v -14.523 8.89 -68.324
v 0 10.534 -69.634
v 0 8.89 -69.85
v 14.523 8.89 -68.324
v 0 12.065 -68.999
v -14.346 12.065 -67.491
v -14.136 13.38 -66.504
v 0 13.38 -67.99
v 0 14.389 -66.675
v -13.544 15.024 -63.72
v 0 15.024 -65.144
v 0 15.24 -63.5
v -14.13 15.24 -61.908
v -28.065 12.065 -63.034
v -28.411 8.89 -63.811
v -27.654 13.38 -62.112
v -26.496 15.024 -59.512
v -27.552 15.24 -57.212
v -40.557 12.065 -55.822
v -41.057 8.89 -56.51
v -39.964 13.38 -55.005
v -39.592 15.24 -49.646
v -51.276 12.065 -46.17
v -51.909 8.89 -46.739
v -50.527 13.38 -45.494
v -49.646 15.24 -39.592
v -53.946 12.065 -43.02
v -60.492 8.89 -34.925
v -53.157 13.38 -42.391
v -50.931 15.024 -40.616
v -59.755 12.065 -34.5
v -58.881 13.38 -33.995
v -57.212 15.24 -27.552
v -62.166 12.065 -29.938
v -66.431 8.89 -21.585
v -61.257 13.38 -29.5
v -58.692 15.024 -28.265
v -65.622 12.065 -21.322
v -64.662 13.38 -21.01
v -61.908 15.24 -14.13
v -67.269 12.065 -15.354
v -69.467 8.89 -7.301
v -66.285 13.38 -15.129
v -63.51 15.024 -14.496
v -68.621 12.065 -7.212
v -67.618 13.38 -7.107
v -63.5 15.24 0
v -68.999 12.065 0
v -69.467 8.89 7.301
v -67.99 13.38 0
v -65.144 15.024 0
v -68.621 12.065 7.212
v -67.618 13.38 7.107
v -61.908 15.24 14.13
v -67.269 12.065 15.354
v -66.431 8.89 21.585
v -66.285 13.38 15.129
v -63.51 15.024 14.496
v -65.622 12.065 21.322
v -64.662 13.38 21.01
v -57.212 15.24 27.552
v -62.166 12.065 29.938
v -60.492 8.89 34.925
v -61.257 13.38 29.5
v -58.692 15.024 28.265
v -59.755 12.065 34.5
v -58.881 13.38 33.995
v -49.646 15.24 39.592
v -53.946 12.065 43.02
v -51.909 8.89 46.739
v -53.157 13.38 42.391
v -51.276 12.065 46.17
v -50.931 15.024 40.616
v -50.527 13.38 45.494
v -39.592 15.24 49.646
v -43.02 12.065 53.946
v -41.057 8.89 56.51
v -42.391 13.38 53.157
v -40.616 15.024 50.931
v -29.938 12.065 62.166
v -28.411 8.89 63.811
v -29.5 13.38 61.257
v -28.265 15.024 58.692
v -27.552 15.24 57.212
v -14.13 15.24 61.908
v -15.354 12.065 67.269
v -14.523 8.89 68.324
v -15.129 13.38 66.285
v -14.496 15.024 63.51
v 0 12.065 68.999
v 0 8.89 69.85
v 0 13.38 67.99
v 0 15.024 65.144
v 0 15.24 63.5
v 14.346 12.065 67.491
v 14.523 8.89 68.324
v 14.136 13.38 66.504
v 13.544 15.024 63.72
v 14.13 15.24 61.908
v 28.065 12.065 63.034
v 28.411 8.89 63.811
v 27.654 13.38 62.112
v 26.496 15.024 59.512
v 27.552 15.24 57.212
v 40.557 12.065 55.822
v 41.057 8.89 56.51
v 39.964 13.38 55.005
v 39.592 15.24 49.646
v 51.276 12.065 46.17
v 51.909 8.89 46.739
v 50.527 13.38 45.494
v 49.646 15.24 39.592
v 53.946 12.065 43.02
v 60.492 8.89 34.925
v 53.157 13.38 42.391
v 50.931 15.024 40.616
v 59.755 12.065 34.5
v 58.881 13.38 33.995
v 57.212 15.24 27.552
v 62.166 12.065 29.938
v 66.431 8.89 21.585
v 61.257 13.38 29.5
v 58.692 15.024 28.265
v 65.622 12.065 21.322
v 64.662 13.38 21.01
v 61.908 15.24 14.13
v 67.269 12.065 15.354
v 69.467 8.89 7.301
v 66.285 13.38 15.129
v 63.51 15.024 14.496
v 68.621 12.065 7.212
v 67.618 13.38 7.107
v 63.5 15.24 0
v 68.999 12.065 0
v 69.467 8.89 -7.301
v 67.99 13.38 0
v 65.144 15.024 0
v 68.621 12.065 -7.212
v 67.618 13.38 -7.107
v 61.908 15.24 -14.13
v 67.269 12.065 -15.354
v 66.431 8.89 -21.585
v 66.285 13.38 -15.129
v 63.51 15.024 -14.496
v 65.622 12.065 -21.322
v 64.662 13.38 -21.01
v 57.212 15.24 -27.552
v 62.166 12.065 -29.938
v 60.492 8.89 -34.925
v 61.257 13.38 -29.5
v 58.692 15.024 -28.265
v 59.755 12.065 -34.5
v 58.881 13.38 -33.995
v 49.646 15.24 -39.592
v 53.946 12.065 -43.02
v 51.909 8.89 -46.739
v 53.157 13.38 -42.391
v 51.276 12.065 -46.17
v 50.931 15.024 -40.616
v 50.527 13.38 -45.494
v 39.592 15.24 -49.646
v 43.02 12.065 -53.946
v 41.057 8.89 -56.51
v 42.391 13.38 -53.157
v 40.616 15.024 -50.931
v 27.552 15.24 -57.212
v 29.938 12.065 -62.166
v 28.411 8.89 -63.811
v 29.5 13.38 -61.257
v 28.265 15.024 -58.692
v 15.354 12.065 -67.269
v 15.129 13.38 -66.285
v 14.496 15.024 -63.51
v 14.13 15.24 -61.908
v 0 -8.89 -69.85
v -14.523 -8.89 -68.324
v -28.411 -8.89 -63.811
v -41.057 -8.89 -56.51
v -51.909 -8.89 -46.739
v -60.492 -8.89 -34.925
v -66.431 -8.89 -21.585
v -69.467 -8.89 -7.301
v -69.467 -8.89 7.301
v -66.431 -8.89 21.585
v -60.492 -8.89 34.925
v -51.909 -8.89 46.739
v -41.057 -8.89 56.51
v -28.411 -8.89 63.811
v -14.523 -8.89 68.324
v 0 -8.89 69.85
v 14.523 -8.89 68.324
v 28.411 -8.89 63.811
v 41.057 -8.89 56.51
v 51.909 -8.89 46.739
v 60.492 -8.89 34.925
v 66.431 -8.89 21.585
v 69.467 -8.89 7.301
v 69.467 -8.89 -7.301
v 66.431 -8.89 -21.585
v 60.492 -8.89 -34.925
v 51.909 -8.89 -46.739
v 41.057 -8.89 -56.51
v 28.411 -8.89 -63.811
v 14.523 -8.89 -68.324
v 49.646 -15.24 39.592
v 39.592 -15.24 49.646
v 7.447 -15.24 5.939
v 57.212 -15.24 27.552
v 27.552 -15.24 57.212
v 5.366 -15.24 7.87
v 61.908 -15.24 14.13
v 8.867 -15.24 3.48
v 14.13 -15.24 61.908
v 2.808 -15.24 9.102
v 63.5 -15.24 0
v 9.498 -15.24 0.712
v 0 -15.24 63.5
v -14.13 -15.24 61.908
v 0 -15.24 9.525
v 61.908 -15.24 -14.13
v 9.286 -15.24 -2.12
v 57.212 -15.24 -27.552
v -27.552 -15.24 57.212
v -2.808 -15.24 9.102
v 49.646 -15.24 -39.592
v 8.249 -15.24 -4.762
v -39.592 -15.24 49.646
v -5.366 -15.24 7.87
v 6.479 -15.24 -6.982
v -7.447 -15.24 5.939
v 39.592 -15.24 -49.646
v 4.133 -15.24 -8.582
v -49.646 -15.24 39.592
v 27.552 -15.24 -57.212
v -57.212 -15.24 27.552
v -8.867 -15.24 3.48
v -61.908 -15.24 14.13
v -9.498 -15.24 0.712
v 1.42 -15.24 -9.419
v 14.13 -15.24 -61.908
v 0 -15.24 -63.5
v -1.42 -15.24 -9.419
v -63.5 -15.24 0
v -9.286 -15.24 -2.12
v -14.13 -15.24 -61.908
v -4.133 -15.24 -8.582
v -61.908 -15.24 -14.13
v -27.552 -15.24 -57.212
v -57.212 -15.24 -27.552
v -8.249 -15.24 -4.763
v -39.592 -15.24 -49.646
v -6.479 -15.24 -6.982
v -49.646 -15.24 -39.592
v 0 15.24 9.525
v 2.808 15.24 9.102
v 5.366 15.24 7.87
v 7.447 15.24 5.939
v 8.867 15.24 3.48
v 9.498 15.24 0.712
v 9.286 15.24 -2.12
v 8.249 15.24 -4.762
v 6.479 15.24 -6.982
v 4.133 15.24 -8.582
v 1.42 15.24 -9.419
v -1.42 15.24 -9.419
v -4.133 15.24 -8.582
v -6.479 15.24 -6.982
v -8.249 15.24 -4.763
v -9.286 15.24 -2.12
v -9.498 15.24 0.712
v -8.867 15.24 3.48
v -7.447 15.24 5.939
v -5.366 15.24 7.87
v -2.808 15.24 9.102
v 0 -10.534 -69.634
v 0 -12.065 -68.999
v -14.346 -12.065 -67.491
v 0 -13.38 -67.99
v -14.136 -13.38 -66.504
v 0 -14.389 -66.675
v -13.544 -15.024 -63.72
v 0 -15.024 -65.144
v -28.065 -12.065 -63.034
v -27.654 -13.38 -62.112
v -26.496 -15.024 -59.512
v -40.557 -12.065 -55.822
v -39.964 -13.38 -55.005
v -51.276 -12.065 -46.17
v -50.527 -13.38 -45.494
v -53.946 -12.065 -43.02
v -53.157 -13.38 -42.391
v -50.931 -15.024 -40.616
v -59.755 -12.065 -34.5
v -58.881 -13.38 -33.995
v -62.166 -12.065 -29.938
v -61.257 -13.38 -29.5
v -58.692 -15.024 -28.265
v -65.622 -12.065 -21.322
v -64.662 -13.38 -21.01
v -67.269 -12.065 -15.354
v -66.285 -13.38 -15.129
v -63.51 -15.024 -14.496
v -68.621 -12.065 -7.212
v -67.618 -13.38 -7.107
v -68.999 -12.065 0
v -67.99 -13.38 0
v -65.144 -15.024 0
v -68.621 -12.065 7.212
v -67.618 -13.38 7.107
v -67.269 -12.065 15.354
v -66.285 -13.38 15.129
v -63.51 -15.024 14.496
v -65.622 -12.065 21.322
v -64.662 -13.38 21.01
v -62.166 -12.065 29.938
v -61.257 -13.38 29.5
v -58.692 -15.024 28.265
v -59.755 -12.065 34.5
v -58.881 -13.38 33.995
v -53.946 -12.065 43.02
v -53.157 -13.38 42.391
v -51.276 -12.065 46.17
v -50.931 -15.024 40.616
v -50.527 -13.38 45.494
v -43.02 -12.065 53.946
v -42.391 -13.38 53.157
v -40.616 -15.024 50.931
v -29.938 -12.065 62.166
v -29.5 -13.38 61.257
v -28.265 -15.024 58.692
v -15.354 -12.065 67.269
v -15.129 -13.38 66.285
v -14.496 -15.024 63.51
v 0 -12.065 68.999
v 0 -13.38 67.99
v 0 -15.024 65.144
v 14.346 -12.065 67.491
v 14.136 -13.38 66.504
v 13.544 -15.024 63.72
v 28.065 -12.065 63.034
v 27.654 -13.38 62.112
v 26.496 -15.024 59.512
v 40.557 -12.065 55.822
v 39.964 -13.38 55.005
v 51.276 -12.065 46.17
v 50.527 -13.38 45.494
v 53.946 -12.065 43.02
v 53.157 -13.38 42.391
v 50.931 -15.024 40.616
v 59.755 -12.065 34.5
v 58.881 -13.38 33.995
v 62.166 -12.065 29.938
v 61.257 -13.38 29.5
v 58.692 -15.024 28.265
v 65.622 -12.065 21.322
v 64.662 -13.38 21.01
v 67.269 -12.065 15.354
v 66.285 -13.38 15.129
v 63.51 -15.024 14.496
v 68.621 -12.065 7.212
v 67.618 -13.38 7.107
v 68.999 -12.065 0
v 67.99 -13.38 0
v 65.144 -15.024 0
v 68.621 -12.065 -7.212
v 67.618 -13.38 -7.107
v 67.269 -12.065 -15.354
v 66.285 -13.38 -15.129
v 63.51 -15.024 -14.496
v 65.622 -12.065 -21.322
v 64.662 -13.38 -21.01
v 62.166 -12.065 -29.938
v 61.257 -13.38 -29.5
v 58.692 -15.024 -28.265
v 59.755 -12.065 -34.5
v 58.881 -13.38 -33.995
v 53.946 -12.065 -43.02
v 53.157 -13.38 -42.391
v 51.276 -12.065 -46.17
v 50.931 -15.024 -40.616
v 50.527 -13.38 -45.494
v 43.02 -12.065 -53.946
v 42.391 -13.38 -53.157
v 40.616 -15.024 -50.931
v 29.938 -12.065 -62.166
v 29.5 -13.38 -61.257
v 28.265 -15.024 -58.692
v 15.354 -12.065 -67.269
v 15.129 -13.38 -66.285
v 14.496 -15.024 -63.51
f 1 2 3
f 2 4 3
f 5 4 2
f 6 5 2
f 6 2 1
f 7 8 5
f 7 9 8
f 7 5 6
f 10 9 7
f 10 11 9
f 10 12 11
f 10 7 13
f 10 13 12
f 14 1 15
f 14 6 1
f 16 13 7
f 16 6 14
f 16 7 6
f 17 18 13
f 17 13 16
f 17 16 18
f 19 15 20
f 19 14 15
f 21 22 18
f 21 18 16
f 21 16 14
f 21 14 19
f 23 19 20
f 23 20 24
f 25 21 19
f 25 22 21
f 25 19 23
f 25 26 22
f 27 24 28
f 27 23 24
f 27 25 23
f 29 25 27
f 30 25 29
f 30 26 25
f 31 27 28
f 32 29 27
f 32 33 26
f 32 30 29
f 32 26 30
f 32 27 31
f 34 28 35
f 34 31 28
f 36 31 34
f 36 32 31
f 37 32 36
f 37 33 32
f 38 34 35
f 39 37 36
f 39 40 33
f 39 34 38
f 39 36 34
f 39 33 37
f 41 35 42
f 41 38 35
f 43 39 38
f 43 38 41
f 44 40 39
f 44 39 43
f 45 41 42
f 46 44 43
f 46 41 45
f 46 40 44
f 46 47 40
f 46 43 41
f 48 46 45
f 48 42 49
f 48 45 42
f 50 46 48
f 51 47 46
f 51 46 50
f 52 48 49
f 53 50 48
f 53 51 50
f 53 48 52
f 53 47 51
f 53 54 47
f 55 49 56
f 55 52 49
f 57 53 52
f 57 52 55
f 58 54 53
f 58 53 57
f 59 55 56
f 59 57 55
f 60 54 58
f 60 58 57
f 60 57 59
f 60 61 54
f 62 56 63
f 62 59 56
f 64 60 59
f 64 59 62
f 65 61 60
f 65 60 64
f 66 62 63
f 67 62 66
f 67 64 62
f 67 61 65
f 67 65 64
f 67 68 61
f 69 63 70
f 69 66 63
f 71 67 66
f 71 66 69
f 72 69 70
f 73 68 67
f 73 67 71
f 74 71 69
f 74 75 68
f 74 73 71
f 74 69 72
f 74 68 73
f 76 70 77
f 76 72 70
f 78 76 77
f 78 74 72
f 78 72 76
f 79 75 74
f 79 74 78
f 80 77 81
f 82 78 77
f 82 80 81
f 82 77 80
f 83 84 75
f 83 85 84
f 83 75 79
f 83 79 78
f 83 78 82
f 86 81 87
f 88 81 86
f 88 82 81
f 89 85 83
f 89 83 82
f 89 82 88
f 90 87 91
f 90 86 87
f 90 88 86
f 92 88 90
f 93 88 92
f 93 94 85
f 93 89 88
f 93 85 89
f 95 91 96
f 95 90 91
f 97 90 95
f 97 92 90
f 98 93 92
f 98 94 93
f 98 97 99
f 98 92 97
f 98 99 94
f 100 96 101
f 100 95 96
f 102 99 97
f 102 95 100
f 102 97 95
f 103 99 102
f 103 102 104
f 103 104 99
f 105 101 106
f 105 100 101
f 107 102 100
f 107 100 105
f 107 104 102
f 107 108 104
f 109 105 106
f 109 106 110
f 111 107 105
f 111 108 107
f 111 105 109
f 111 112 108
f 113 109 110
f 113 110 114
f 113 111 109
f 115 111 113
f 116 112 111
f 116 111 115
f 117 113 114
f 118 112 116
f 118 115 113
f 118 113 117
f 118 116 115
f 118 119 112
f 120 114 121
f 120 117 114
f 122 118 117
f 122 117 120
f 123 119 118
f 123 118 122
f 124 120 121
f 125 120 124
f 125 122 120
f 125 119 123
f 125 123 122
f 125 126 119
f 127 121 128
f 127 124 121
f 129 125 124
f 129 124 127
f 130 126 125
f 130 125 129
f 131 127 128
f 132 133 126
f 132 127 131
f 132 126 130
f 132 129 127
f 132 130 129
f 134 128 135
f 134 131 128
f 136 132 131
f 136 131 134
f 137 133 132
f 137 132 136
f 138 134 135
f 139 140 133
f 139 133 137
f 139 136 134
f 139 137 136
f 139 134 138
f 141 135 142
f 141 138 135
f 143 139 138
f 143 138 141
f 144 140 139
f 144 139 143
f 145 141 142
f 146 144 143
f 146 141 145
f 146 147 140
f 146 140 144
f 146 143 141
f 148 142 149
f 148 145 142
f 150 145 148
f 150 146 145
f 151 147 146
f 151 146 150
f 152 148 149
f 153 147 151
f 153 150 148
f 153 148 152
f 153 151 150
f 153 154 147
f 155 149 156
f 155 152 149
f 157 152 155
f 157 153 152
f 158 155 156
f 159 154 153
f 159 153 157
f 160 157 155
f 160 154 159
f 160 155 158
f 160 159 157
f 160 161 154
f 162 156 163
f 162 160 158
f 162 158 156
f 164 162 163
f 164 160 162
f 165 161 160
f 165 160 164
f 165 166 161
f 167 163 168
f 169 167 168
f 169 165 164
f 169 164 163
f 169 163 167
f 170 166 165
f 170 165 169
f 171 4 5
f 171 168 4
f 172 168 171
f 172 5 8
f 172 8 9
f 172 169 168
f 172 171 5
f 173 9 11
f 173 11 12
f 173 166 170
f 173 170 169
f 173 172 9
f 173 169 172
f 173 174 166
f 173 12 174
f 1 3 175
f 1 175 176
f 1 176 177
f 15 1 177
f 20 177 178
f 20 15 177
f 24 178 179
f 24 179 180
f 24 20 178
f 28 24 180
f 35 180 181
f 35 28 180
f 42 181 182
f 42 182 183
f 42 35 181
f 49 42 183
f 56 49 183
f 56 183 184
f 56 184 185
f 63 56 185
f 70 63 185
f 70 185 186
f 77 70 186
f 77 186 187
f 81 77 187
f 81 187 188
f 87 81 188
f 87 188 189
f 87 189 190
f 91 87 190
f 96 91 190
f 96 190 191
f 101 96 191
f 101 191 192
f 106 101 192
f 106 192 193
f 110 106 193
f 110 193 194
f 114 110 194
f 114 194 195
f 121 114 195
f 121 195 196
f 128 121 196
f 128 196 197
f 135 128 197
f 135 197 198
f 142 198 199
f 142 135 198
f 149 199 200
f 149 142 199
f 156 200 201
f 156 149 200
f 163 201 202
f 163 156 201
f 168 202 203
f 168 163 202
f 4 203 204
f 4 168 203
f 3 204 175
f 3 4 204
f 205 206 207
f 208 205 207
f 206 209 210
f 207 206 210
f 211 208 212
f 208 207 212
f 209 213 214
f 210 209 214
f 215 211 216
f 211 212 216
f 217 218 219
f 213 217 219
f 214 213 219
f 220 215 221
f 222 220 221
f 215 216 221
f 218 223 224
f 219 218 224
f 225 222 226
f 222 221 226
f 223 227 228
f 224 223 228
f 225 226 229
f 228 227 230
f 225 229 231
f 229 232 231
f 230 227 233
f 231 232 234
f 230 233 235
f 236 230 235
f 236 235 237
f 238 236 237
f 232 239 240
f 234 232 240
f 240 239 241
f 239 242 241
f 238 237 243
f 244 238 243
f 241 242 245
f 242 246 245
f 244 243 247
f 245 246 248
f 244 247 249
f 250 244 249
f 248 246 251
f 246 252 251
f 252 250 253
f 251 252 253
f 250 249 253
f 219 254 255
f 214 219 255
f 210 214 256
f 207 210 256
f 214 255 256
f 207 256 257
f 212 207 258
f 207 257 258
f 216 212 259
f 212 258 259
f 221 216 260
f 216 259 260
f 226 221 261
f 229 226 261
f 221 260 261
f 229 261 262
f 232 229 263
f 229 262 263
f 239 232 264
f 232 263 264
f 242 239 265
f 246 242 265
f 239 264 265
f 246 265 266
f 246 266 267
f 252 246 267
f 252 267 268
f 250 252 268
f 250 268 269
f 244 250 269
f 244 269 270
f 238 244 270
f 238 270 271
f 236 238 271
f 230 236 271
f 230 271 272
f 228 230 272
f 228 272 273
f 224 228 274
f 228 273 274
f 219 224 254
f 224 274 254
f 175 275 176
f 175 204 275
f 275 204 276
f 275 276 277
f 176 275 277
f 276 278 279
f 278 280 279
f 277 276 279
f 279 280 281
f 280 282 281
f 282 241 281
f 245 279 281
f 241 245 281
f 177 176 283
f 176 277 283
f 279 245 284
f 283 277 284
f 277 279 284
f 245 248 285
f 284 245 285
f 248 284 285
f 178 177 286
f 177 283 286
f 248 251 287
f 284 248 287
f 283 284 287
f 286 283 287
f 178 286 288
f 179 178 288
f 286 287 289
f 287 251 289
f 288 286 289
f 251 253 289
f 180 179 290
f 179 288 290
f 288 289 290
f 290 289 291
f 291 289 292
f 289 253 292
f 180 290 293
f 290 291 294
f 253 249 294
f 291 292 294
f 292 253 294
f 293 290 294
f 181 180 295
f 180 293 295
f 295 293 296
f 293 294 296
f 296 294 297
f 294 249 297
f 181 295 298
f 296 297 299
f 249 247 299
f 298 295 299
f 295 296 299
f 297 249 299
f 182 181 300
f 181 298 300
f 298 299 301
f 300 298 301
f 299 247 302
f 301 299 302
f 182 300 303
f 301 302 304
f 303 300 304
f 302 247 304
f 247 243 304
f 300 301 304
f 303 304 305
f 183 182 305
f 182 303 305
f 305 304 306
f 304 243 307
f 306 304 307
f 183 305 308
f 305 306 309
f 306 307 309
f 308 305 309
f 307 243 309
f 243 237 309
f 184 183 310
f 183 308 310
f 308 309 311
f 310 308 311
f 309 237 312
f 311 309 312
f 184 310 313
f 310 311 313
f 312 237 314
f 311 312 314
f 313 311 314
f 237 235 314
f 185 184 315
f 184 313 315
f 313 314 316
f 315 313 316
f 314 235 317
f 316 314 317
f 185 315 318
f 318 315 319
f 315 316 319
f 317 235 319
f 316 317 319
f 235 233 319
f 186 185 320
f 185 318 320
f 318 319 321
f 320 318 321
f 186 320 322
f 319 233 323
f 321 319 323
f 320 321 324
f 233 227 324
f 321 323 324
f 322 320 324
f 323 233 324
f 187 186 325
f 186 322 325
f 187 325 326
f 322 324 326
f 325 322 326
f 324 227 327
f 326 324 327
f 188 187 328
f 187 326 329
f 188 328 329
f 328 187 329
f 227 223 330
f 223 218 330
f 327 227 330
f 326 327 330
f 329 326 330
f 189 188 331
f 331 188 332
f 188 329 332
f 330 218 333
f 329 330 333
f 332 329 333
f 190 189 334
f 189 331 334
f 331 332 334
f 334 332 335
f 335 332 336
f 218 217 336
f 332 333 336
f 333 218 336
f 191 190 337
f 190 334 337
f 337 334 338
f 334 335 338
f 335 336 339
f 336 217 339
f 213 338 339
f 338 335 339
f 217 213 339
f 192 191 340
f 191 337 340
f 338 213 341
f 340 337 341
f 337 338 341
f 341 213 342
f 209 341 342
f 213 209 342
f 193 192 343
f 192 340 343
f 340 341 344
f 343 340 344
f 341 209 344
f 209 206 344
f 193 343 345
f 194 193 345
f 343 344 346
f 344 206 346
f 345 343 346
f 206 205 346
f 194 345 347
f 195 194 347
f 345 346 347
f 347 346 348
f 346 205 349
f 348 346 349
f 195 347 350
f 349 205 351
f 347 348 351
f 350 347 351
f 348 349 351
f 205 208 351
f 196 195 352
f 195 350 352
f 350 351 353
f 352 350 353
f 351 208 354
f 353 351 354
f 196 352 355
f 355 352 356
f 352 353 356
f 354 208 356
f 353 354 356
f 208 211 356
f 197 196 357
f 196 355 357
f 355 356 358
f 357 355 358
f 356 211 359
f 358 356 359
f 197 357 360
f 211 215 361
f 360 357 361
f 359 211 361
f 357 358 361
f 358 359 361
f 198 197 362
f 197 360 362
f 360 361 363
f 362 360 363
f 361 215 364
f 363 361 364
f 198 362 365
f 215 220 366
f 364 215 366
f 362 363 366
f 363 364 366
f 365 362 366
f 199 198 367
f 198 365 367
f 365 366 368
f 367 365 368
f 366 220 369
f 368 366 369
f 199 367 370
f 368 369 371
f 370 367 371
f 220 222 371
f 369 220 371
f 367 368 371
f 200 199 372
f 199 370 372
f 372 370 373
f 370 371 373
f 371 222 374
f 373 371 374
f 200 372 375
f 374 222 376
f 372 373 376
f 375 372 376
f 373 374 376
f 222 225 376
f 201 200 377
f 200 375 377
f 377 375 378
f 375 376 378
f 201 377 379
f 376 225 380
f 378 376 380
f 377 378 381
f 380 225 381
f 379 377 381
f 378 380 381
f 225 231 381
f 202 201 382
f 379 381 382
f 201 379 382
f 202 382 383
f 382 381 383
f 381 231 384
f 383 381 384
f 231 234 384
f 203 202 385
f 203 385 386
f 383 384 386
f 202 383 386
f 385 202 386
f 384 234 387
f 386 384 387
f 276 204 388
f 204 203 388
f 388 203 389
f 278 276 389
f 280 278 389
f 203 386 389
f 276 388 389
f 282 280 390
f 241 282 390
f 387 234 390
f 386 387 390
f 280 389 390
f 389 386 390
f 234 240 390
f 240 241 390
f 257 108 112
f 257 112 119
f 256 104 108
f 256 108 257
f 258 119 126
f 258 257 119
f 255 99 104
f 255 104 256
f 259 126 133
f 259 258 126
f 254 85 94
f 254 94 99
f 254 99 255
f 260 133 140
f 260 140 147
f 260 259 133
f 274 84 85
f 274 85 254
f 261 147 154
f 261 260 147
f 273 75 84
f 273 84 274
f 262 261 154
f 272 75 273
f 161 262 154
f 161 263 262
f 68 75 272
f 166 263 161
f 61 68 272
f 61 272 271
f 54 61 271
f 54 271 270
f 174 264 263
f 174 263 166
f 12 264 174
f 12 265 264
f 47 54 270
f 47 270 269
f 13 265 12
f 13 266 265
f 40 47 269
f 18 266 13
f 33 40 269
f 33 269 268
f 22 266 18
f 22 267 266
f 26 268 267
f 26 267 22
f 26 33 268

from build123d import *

# Parameters (mm, degrees)
SKETCH1_R           = 69.85
BOSS_EXTRUDE1_DEPTH = 15.24
SKETCH2_R           = 9.525
CUT_EXTRUDE1_DEPTH  = 30.48
FILLET1_R           = 6.35


with BuildPart() as part:
    # Sketch1 → Boss-Extrude1 (new, symmetric)
    with BuildSketch(Plane(origin=(0, 0, 0), x_dir=(1, 0, 0), z_dir=(0, 1, 0))):
        with Locations(Location((0, 0, 0), (0, 0, 90))):
            Circle(SKETCH1_R)
    extrude(amount=BOSS_EXTRUDE1_DEPTH, both=True)

    # Sketch2 → Cut-Extrude1 (cut)
    with BuildSketch(Plane(origin=(0, 15.24, 0), x_dir=(1, 0, 0), z_dir=(0, 1, 0))):
        with Locations(Location((0, 0, 0), (0, 0, 270))):
            Circle(SKETCH2_R)
    extrude(amount=-CUT_EXTRUDE1_DEPTH, mode=Mode.SUBTRACT)

    # Fillet1
    fillet1_edges = [part.edges().sort_by_distance(p)[0] for p in [
        (0, -15.24, 69.85),
        (0, 15.24, 69.85),
    ]]
    fillet(fillet1_edges, radius=FILLET1_R)


solid = part.part
